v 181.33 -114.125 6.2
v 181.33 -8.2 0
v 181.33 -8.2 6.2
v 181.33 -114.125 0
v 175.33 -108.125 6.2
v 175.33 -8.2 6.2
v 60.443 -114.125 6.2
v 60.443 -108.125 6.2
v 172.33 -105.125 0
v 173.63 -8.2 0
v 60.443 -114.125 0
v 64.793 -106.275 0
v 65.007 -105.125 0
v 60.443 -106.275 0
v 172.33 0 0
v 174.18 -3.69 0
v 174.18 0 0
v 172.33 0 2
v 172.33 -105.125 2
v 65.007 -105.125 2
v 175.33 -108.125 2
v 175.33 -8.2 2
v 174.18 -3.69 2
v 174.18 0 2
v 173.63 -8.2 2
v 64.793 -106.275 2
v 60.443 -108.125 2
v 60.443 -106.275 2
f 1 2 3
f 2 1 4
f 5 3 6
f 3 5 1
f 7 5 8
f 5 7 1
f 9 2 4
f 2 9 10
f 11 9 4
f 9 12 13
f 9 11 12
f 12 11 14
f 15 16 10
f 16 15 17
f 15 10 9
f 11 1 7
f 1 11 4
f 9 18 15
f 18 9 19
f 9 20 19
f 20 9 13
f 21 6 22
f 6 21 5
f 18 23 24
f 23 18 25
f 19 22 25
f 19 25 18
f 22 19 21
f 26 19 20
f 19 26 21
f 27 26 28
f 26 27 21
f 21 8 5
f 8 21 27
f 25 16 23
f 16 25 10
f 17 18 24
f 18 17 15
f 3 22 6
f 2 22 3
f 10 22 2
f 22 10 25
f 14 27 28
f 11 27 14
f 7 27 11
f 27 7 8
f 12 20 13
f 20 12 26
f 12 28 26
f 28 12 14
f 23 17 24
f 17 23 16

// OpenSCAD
// ============================================
// Plate 11: 프레임 - 하단 우 (BR)
// 크기: ~121 x ~114 mm (OK)
// ============================================
use <../src/model_a_frame.scad>

frame_seg_BR();
